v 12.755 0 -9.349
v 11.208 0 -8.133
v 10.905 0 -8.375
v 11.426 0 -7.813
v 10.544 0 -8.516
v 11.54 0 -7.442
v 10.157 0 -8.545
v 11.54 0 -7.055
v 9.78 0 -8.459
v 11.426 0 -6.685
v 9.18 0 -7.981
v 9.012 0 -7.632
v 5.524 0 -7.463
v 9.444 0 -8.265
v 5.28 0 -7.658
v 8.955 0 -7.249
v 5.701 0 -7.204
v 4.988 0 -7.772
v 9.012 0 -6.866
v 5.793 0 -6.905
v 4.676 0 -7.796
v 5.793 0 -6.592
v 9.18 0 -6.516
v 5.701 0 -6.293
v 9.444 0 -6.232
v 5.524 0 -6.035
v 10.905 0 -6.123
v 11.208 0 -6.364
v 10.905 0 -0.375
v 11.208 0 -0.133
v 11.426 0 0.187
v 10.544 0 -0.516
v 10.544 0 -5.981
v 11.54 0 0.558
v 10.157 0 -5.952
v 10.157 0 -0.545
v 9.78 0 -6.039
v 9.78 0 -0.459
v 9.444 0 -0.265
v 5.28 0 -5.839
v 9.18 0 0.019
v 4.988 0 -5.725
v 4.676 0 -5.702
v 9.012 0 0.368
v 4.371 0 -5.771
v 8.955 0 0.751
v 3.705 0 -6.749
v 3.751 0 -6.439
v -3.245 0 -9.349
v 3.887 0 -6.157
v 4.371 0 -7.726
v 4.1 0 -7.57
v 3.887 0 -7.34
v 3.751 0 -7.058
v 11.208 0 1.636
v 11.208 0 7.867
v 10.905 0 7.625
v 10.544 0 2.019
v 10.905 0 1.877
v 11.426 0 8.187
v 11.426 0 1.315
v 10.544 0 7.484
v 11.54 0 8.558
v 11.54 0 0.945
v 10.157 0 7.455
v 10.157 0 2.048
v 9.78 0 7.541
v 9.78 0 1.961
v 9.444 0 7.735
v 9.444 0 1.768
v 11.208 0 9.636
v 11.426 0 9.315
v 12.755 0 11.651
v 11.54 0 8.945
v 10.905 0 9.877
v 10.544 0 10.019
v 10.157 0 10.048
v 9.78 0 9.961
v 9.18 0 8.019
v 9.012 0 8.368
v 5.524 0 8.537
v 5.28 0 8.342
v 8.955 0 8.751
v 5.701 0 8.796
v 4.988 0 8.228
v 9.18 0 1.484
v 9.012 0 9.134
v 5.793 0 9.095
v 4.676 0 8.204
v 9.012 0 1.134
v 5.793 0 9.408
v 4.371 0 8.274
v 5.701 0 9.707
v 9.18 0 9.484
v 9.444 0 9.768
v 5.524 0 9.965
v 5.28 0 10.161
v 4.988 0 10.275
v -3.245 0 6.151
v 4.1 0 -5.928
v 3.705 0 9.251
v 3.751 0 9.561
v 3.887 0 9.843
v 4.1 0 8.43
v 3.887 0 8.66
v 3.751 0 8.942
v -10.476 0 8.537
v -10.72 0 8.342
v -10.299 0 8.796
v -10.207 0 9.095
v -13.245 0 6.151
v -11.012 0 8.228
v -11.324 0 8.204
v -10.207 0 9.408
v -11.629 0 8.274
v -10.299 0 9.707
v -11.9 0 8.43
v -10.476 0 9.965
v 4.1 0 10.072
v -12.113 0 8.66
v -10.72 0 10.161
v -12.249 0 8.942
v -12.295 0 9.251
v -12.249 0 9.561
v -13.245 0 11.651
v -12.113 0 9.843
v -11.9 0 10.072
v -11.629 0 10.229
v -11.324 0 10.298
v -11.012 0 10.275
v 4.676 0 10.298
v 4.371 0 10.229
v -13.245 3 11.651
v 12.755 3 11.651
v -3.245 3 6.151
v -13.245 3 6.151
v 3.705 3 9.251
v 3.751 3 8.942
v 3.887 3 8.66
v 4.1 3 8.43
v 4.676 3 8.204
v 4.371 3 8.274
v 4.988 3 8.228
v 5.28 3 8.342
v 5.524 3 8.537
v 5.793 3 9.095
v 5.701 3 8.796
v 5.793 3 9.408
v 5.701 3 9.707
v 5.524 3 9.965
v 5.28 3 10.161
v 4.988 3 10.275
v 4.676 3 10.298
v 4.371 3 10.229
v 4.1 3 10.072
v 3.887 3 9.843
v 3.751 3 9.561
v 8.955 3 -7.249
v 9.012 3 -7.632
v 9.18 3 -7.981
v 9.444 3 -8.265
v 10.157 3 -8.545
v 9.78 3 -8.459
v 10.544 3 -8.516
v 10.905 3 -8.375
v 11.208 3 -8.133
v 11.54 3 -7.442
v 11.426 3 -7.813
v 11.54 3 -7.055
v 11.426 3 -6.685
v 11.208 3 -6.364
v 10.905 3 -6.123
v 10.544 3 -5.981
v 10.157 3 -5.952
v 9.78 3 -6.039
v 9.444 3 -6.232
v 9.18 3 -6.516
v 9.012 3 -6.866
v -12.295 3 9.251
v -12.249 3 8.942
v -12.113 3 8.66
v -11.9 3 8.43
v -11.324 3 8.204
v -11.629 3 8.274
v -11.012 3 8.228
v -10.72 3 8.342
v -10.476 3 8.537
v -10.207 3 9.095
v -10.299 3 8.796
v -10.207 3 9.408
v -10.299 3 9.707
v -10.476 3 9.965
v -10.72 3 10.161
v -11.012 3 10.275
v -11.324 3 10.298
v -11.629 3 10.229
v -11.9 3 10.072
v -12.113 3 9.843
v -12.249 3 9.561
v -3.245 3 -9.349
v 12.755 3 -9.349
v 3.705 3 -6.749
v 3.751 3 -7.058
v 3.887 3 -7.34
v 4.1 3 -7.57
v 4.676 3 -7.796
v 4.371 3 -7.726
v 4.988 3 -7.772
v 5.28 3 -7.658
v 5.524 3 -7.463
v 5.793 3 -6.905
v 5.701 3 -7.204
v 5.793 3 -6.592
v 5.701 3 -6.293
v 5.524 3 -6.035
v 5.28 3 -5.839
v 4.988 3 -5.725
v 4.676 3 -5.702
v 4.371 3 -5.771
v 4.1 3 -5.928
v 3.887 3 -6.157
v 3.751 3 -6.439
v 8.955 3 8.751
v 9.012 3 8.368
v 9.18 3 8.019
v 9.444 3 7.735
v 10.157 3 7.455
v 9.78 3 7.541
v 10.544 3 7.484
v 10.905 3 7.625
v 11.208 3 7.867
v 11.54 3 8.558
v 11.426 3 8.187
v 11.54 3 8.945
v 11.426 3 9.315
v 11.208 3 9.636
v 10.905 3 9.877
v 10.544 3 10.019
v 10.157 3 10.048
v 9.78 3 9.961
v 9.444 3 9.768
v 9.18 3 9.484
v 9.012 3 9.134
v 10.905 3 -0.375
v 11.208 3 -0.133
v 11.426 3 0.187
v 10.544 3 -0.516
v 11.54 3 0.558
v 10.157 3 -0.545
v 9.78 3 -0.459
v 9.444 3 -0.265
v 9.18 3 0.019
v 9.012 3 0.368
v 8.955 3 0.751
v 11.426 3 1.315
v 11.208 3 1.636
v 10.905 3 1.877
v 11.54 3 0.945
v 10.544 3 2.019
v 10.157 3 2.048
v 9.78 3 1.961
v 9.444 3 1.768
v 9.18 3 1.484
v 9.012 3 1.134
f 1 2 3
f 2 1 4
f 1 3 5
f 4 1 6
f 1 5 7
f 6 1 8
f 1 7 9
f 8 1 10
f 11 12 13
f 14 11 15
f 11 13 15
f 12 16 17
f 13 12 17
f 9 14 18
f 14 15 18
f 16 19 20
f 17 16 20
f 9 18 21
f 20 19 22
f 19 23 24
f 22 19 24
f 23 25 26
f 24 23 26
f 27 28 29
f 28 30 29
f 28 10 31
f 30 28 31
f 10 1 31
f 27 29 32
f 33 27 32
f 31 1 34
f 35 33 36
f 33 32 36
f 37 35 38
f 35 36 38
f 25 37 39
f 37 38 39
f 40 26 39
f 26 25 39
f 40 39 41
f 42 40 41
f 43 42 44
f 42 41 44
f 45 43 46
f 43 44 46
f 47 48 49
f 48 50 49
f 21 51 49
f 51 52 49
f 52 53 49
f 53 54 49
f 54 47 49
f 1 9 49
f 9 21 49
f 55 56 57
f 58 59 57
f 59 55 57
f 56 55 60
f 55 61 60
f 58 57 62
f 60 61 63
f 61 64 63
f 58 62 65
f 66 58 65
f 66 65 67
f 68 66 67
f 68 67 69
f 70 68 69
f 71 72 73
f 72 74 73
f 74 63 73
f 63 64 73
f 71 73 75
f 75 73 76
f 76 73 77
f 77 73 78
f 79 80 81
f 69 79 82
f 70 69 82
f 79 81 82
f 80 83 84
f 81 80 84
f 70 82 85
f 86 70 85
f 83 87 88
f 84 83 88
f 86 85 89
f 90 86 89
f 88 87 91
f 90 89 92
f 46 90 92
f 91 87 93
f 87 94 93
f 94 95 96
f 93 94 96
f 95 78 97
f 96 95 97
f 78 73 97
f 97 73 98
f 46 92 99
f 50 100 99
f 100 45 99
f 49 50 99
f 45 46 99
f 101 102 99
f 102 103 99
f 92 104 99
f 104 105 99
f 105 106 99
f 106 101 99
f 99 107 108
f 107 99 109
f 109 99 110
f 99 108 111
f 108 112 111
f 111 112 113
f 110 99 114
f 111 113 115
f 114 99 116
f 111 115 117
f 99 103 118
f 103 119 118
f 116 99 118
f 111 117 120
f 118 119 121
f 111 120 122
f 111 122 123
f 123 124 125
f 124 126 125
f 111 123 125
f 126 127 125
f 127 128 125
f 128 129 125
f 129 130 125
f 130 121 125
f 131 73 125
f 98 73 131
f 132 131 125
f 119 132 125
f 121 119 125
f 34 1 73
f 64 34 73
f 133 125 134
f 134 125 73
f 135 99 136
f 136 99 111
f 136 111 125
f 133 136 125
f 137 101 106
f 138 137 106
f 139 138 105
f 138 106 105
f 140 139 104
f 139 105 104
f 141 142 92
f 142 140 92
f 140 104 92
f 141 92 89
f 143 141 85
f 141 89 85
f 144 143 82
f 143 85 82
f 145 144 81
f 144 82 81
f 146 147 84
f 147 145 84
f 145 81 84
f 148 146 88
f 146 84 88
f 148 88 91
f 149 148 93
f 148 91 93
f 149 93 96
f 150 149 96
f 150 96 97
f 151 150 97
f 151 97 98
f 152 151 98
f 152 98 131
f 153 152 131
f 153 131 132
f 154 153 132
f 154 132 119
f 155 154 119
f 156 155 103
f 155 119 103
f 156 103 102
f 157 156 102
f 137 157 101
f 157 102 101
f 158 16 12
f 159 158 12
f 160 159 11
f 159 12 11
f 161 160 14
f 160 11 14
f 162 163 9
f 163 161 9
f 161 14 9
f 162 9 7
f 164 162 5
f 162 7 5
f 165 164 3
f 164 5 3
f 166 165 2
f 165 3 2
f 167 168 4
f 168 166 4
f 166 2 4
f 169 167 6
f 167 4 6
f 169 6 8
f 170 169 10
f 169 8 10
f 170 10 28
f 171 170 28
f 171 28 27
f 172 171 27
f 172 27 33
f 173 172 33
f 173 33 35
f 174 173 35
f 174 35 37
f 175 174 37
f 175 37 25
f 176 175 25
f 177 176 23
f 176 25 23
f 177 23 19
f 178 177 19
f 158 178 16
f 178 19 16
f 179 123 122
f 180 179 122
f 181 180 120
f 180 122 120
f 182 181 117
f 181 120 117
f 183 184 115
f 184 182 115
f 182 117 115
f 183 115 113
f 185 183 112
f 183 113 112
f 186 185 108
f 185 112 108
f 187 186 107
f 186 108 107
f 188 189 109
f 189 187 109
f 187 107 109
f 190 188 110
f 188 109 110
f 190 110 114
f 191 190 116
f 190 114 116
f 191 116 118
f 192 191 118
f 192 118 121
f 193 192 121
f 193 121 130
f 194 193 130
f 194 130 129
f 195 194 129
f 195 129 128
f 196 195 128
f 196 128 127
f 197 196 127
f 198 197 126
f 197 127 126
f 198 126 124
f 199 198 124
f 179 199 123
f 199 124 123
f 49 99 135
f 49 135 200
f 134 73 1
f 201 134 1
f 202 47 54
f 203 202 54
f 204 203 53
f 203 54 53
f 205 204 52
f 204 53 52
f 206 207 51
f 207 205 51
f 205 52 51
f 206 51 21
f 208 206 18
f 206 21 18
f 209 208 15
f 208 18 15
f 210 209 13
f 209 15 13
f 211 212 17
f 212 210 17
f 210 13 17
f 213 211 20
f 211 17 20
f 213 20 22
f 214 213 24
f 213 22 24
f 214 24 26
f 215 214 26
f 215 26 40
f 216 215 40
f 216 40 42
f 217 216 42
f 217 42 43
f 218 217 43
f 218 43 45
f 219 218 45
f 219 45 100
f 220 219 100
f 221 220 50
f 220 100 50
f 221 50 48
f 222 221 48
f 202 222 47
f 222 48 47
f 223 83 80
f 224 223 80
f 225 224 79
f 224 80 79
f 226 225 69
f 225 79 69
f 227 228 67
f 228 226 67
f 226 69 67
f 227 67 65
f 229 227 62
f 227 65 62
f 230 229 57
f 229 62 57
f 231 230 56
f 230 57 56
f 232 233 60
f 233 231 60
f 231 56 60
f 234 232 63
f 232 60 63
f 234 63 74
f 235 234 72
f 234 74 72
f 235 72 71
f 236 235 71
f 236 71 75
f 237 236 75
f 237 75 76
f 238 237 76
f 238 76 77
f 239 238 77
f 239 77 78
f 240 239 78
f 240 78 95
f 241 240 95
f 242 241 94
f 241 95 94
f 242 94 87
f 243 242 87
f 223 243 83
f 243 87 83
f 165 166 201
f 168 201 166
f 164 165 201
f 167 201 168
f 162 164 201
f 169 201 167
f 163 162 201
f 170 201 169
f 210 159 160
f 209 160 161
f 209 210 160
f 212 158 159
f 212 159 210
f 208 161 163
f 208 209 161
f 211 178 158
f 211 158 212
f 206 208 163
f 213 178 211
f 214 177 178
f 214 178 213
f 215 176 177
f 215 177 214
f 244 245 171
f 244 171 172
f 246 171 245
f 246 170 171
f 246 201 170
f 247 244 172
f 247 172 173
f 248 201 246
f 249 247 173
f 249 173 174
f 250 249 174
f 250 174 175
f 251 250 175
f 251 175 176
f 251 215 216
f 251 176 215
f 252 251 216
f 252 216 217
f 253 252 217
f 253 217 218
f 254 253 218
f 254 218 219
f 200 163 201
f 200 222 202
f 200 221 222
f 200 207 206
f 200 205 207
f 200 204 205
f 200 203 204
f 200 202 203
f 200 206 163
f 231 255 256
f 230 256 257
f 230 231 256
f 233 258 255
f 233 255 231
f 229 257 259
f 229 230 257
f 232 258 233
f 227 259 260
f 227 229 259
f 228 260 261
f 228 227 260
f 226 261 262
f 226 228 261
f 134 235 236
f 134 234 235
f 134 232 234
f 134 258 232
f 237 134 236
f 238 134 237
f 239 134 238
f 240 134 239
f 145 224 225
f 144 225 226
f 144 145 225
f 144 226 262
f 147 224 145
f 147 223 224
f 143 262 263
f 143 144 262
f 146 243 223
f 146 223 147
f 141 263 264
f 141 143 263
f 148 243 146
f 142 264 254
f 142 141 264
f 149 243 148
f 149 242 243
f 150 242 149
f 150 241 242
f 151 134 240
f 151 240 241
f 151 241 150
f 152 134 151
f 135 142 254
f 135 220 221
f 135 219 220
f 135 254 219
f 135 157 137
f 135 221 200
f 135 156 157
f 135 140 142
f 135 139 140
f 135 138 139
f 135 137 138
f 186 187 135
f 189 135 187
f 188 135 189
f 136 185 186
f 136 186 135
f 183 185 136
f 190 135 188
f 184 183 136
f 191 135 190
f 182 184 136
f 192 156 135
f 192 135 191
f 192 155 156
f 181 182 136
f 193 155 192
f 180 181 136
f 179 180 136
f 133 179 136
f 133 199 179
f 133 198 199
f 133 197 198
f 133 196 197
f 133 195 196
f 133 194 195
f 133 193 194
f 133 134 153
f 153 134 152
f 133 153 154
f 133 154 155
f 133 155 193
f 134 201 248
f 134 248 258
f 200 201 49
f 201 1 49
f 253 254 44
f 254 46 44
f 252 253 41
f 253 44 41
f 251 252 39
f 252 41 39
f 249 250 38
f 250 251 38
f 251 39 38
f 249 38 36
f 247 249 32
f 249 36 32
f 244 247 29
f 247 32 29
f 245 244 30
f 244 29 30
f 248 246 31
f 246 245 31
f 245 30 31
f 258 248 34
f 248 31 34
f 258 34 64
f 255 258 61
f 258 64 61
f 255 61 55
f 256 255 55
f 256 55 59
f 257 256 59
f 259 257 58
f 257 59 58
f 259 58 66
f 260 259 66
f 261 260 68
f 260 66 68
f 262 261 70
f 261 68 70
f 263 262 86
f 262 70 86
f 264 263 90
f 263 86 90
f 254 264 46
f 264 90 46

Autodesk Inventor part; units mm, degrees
ref_plane "YZ Plane" through (0, 0, 0) normal (1, 0, 0) x (0, 1, 0)
ref_plane "XZ Plane" through (0, 0, 0) normal (0, 1, 0) x (-1, 0, 0)
ref_plane "XY Plane" through (0, 0, 0) normal (0, 0, 1) x (1, 0, 0)
sketch "Эскиз1" plane through (0, 0, 0) normal (0, 1, 0) x (-1, 0, 0)
  circle A0 centre (-10.2546, 8.7513) radius 1.3
  circle A1 centre (-4.7546, 9.2513) radius 1.05
  circle A2 centre (-10.2546, 0.7513) radius 1.3
  circle A3 centre (-10.2546, -7.2487) radius 1.3
  circle A4 centre (-4.7546, -6.7487) radius 1.05
  circle A5 centre (11.2454, 9.2513) radius 1.05
  line L0 (-6.7546, 3.1513) -> (13.2454, 3.1513)
  line L1 (-6.7546, -3.3987) -> (-6.7546, 3.1513)
  line L2 (13.2454, -3.3987) -> (-6.7546, -3.3987)
  line L3 (13.2454, 3.1513) -> (13.2454, -3.3987)
  line L4 (3.2454, 3.1513) -> (3.2454, 6.1513)
  line L5 (3.2454, 6.1513) -> (13.2454, 6.1513)
  line L6 (13.2454, 6.1513) -> (13.2454, 11.6513)
  line L7 (13.2454, 11.6513) -> (-12.7546, 11.6513)
  line L8 (-12.7546, 11.6513) -> (-12.7546, -9.3487)
  line L9 (-12.7546, -9.3487) -> (3.2454, -9.3487)
  line L10 (3.2454, -3.3987) -> (3.2454, -6.3987)
  line L11 (3.2454, -6.3987) -> (3.2454, -9.3487)
  line L12 (3.2454, 3.1513) -> (3.2454, -3.3987)
  point P0 (0, 0)
  dimension "d0" = 3
  dimension "d1" = 5.5
  dimension "d2" = 26
  dimension "d3" = 21
  dimension "d4" = 3
extrude "Выдавливание1" add sketch "Эскиз1" along normal blind 3 contours L1 L2 L10 L11 L9 L8 L7 L6 L5 L4 L0 | L0 L12 L2 L1
properties part number "КВ33.044.407 - Заглушка разъема"
